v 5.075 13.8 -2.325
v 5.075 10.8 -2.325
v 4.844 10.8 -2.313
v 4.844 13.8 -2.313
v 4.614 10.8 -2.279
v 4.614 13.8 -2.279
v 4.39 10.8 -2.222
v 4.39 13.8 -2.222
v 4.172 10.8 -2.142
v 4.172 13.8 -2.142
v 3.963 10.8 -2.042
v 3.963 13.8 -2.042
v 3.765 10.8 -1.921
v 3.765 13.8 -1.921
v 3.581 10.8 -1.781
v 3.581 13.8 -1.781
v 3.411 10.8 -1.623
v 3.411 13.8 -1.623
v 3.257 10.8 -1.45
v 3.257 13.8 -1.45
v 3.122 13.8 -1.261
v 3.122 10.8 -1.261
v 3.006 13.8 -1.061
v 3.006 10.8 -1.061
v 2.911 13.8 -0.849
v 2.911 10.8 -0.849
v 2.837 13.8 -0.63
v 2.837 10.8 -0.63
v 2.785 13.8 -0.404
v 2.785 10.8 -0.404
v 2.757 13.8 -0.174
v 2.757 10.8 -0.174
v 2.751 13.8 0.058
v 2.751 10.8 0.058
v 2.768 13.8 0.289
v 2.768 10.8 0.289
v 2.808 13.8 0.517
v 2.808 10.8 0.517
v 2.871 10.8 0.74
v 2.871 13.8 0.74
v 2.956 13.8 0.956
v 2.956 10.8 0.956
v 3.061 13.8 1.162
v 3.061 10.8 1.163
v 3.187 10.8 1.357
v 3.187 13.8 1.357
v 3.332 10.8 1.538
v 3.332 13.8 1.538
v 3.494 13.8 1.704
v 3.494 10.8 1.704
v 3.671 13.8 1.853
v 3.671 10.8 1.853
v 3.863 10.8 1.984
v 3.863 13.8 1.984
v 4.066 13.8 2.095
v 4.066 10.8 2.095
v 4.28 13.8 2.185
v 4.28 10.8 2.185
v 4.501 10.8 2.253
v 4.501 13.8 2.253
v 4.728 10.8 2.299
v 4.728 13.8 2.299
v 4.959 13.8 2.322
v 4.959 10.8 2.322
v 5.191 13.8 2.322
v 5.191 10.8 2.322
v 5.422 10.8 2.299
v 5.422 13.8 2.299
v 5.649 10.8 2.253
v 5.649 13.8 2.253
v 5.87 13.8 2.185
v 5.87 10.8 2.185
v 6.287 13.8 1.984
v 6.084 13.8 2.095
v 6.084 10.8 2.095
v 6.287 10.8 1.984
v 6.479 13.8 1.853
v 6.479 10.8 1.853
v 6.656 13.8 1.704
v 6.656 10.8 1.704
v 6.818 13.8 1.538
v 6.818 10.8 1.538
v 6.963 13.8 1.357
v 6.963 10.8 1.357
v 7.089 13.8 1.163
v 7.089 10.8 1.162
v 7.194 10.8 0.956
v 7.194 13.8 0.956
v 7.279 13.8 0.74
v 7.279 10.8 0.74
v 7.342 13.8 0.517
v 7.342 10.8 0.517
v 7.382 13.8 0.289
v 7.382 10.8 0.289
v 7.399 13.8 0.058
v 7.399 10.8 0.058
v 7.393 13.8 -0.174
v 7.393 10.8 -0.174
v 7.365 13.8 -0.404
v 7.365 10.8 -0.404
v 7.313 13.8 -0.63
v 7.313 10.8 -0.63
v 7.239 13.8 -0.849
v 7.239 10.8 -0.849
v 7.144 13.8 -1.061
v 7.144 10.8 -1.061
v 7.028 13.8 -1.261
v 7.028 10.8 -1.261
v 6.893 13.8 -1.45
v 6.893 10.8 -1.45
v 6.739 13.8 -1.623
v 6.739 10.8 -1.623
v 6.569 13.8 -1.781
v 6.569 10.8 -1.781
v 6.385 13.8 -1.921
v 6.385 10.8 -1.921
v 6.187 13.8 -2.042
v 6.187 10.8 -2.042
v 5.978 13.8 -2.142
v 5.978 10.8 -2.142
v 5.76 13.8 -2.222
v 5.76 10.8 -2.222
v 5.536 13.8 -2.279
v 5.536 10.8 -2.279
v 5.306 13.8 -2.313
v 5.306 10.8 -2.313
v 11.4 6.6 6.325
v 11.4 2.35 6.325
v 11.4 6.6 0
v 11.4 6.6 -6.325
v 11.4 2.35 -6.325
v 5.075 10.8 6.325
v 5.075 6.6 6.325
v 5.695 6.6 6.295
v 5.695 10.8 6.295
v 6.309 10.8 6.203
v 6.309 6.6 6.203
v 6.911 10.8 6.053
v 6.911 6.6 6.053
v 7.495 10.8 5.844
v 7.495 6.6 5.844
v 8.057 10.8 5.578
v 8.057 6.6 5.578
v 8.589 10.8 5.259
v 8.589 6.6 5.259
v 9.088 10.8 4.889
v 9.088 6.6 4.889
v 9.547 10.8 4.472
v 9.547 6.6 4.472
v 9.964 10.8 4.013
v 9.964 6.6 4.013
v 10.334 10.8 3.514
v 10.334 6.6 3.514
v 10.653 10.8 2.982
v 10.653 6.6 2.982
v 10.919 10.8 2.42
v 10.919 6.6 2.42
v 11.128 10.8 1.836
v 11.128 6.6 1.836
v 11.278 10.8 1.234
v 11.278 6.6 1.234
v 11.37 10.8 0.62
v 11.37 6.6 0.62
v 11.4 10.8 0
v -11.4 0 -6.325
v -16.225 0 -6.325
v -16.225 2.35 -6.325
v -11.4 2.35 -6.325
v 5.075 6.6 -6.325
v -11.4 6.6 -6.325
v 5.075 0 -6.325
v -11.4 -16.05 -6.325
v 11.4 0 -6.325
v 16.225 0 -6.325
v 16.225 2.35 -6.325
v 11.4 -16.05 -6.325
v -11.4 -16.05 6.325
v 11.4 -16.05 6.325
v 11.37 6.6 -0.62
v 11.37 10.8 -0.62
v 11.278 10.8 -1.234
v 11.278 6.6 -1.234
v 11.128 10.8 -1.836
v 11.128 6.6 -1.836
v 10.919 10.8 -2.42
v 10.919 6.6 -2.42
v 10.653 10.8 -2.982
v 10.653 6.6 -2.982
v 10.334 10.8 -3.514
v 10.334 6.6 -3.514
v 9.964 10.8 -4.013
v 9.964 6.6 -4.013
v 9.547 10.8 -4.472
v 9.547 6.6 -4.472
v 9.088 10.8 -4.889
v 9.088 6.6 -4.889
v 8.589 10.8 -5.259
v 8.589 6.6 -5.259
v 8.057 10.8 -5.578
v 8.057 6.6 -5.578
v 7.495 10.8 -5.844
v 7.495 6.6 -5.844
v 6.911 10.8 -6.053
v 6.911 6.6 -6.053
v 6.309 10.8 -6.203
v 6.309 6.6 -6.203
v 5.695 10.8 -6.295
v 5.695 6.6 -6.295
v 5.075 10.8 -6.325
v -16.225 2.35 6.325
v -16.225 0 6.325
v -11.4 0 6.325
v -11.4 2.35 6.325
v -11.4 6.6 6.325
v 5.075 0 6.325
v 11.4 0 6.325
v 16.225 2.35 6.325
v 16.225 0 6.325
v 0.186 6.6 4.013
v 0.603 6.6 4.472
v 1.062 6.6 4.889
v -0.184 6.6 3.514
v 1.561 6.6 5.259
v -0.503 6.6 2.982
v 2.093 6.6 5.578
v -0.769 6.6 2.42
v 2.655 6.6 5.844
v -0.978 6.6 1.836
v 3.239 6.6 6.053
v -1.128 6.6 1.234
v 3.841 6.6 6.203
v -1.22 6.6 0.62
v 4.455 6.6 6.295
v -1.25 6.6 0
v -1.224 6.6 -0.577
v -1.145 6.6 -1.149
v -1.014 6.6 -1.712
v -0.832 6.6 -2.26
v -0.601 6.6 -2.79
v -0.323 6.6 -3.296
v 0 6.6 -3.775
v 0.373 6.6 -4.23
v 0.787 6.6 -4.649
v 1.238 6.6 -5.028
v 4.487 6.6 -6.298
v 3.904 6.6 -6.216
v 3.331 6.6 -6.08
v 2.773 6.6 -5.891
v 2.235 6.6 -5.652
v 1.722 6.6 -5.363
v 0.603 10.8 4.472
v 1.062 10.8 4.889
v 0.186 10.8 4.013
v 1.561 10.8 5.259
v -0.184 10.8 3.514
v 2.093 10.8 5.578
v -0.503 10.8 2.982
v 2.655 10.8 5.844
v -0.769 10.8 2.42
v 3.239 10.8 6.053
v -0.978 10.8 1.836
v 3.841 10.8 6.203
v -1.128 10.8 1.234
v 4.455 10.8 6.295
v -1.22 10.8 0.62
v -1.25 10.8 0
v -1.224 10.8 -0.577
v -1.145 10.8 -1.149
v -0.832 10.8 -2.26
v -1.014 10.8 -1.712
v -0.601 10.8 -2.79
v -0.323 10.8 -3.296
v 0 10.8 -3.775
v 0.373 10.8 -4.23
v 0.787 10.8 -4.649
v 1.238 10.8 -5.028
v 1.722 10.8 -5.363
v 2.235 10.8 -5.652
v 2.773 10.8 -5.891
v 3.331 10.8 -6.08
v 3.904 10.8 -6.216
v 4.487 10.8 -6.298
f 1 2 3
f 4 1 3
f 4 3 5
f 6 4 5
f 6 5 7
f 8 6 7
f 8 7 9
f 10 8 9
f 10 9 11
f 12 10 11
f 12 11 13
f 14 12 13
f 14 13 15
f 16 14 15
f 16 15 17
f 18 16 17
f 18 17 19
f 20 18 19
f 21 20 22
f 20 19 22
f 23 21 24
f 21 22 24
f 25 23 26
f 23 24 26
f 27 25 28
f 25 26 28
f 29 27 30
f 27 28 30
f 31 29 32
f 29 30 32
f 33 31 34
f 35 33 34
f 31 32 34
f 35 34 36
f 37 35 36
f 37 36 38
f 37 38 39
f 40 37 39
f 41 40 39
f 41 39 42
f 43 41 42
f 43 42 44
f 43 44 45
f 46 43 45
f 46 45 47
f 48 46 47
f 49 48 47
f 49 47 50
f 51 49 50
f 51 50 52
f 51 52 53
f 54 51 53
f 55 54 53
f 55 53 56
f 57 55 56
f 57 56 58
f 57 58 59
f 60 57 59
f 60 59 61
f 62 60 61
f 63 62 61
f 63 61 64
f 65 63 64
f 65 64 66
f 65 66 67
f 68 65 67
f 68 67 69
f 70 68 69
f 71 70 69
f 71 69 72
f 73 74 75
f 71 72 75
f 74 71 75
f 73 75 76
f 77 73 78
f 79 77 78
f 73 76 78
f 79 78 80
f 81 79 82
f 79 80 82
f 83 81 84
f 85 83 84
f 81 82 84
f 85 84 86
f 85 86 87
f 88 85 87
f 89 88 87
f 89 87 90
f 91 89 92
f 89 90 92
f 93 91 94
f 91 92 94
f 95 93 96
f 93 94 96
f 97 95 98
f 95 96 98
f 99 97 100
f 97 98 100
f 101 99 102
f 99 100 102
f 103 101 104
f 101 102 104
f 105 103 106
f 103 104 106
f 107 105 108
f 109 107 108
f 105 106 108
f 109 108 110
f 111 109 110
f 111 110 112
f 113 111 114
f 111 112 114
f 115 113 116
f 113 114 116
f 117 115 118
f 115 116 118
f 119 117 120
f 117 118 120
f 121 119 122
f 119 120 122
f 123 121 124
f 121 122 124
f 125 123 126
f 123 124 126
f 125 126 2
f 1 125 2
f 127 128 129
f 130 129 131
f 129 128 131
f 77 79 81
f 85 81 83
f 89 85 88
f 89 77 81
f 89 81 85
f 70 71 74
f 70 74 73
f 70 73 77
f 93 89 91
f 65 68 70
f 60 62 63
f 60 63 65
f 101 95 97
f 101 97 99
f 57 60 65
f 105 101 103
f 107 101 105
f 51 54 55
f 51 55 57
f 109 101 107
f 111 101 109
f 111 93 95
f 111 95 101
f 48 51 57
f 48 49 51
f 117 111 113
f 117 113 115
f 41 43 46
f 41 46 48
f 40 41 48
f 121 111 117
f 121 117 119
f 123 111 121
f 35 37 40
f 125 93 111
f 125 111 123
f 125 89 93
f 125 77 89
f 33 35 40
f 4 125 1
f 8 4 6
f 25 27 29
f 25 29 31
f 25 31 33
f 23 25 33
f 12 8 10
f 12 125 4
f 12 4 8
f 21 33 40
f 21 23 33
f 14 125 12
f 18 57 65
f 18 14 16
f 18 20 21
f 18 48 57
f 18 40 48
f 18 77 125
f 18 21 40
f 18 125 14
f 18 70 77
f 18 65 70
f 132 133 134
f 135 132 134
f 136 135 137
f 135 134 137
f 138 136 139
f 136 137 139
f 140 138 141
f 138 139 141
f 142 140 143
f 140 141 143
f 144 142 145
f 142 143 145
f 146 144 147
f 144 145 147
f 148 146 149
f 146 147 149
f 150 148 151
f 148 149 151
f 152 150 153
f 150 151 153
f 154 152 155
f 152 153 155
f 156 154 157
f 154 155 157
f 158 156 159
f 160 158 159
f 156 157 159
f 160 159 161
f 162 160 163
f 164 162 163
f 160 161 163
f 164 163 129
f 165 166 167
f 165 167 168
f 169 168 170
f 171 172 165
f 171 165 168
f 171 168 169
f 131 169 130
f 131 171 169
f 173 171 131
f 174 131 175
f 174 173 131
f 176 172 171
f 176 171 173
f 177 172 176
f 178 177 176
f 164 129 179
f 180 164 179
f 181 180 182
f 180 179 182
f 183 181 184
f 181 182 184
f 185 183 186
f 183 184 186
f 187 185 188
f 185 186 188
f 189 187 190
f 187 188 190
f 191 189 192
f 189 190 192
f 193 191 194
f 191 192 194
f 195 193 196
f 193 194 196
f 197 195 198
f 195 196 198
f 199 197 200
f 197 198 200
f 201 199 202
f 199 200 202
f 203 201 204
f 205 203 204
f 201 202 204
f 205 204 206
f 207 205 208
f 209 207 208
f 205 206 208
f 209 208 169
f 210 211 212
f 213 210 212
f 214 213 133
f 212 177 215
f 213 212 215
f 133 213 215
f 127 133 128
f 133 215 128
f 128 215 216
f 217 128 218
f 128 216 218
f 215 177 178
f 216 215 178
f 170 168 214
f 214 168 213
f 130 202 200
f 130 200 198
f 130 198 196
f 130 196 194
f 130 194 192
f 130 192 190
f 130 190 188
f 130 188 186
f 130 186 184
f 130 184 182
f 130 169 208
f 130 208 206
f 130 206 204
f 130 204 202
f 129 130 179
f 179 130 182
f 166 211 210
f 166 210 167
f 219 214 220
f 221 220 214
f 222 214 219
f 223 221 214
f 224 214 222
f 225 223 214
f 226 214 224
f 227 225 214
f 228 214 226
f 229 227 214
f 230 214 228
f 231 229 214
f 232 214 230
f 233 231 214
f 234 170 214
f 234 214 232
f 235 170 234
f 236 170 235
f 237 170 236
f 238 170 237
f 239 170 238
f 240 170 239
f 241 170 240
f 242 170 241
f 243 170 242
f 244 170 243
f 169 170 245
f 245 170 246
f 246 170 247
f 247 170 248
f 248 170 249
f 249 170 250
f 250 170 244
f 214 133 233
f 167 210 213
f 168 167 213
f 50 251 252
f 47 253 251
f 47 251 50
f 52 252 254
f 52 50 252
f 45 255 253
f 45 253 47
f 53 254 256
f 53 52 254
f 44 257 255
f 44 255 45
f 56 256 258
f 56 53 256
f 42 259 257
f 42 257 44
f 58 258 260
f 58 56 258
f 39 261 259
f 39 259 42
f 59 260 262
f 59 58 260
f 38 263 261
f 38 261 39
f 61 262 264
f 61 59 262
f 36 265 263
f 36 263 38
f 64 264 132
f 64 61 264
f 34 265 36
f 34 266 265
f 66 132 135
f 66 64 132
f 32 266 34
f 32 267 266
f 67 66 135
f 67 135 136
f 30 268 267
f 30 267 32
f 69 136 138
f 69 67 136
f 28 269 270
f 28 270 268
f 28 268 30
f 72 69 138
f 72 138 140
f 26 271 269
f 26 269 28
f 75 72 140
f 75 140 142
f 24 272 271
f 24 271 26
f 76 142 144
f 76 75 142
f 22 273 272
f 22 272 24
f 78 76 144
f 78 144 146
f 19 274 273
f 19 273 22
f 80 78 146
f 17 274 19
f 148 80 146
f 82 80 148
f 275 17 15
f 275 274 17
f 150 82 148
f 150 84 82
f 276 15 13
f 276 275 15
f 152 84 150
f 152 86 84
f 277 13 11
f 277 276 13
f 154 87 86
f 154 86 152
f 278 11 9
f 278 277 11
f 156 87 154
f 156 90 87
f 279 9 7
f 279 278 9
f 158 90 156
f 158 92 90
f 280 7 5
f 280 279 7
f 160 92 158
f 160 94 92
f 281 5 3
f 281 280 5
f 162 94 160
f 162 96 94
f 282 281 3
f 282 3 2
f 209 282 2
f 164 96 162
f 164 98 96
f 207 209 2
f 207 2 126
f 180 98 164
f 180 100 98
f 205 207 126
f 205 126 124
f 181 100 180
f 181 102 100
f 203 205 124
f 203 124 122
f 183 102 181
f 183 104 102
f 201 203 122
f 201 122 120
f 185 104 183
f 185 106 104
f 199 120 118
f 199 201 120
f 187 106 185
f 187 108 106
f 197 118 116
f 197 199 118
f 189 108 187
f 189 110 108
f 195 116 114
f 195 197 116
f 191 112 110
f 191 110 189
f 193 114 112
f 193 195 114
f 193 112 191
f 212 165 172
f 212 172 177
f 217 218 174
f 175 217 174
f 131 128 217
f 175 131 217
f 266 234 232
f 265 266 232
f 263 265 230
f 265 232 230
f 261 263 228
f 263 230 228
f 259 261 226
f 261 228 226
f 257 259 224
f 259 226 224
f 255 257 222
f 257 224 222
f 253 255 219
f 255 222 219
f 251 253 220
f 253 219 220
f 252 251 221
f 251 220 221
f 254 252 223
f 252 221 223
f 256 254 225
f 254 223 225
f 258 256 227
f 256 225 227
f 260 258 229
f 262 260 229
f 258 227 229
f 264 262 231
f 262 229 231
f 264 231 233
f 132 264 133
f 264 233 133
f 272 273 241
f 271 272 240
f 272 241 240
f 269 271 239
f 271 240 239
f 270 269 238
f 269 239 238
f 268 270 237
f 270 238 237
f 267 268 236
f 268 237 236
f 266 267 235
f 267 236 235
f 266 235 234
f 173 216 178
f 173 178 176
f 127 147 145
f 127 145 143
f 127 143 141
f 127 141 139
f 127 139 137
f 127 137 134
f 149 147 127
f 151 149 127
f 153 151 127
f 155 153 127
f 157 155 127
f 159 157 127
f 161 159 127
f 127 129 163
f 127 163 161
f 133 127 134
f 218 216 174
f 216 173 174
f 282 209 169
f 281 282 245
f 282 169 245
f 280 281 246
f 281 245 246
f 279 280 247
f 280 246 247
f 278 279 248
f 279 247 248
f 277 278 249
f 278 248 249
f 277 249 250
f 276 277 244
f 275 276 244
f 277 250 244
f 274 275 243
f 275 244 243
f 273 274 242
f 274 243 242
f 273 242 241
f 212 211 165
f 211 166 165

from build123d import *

# Parameters (mm, degrees)
SKETCH1_W           = 22.8
SKETCH1_H           = 12.65
BOSS_EXTRUDE1_DEPTH = 16.05
SKETCH1_3_W         = 32.45
SKETCH1_3_H         = 12.65
BOSS_EXTRUDE2_DEPTH = 2.35
SKETCH1_4_W         = 22.8
SKETCH1_4_H         = 12.65
BOSS_EXTRUDE3_DEPTH = 6.6
SKETCH1_5_R         = 6.325
BOSS_EXTRUDE4_DEPTH = 10.8
SKETCH1_6_R         = 2.325
BOSS_EXTRUDE5_DEPTH = 13.8


with BuildPart() as part:
    # Sketch1 → Boss-Extrude1 (new body)
    with BuildSketch(Plane(origin=(0, 0, 0), x_dir=(1, 0, 0), z_dir=(0, 1, 0))):
        Rectangle(SKETCH1_W, SKETCH1_H)
    extrude(amount=-BOSS_EXTRUDE1_DEPTH)

    # Sketch1<3> → Boss-Extrude2 (add)
    with BuildSketch(Plane(origin=(0, 0, 0), x_dir=(1, 0, 0), z_dir=(0, 1, 0))):
        Rectangle(SKETCH1_3_W, SKETCH1_3_H)
    extrude(amount=BOSS_EXTRUDE2_DEPTH)

    # Sketch1<4> → Boss-Extrude3 (add)
    with BuildSketch(Plane(origin=(0, 0, 0), x_dir=(1, 0, 0), z_dir=(0, 1, 0))):
        Rectangle(SKETCH1_4_W, SKETCH1_4_H)
    extrude(amount=BOSS_EXTRUDE3_DEPTH)

    # Sketch1<5> → Boss-Extrude4 (add)
    with BuildSketch(Plane(origin=(0, 0, 0), x_dir=(1, 0, 0), z_dir=(0, 1, 0))):
        with Locations((5.075, 0)):
            Circle(SKETCH1_5_R)
    extrude(amount=BOSS_EXTRUDE4_DEPTH)

    # Sketch1<6> → Boss-Extrude5 (add)
    with BuildSketch(Plane(origin=(0, 0, 0), x_dir=(1, 0, 0), z_dir=(0, 1, 0))):
        with Locations((5.075, 0)):
            Circle(SKETCH1_6_R)
    extrude(amount=BOSS_EXTRUDE5_DEPTH)


solid = part.part
